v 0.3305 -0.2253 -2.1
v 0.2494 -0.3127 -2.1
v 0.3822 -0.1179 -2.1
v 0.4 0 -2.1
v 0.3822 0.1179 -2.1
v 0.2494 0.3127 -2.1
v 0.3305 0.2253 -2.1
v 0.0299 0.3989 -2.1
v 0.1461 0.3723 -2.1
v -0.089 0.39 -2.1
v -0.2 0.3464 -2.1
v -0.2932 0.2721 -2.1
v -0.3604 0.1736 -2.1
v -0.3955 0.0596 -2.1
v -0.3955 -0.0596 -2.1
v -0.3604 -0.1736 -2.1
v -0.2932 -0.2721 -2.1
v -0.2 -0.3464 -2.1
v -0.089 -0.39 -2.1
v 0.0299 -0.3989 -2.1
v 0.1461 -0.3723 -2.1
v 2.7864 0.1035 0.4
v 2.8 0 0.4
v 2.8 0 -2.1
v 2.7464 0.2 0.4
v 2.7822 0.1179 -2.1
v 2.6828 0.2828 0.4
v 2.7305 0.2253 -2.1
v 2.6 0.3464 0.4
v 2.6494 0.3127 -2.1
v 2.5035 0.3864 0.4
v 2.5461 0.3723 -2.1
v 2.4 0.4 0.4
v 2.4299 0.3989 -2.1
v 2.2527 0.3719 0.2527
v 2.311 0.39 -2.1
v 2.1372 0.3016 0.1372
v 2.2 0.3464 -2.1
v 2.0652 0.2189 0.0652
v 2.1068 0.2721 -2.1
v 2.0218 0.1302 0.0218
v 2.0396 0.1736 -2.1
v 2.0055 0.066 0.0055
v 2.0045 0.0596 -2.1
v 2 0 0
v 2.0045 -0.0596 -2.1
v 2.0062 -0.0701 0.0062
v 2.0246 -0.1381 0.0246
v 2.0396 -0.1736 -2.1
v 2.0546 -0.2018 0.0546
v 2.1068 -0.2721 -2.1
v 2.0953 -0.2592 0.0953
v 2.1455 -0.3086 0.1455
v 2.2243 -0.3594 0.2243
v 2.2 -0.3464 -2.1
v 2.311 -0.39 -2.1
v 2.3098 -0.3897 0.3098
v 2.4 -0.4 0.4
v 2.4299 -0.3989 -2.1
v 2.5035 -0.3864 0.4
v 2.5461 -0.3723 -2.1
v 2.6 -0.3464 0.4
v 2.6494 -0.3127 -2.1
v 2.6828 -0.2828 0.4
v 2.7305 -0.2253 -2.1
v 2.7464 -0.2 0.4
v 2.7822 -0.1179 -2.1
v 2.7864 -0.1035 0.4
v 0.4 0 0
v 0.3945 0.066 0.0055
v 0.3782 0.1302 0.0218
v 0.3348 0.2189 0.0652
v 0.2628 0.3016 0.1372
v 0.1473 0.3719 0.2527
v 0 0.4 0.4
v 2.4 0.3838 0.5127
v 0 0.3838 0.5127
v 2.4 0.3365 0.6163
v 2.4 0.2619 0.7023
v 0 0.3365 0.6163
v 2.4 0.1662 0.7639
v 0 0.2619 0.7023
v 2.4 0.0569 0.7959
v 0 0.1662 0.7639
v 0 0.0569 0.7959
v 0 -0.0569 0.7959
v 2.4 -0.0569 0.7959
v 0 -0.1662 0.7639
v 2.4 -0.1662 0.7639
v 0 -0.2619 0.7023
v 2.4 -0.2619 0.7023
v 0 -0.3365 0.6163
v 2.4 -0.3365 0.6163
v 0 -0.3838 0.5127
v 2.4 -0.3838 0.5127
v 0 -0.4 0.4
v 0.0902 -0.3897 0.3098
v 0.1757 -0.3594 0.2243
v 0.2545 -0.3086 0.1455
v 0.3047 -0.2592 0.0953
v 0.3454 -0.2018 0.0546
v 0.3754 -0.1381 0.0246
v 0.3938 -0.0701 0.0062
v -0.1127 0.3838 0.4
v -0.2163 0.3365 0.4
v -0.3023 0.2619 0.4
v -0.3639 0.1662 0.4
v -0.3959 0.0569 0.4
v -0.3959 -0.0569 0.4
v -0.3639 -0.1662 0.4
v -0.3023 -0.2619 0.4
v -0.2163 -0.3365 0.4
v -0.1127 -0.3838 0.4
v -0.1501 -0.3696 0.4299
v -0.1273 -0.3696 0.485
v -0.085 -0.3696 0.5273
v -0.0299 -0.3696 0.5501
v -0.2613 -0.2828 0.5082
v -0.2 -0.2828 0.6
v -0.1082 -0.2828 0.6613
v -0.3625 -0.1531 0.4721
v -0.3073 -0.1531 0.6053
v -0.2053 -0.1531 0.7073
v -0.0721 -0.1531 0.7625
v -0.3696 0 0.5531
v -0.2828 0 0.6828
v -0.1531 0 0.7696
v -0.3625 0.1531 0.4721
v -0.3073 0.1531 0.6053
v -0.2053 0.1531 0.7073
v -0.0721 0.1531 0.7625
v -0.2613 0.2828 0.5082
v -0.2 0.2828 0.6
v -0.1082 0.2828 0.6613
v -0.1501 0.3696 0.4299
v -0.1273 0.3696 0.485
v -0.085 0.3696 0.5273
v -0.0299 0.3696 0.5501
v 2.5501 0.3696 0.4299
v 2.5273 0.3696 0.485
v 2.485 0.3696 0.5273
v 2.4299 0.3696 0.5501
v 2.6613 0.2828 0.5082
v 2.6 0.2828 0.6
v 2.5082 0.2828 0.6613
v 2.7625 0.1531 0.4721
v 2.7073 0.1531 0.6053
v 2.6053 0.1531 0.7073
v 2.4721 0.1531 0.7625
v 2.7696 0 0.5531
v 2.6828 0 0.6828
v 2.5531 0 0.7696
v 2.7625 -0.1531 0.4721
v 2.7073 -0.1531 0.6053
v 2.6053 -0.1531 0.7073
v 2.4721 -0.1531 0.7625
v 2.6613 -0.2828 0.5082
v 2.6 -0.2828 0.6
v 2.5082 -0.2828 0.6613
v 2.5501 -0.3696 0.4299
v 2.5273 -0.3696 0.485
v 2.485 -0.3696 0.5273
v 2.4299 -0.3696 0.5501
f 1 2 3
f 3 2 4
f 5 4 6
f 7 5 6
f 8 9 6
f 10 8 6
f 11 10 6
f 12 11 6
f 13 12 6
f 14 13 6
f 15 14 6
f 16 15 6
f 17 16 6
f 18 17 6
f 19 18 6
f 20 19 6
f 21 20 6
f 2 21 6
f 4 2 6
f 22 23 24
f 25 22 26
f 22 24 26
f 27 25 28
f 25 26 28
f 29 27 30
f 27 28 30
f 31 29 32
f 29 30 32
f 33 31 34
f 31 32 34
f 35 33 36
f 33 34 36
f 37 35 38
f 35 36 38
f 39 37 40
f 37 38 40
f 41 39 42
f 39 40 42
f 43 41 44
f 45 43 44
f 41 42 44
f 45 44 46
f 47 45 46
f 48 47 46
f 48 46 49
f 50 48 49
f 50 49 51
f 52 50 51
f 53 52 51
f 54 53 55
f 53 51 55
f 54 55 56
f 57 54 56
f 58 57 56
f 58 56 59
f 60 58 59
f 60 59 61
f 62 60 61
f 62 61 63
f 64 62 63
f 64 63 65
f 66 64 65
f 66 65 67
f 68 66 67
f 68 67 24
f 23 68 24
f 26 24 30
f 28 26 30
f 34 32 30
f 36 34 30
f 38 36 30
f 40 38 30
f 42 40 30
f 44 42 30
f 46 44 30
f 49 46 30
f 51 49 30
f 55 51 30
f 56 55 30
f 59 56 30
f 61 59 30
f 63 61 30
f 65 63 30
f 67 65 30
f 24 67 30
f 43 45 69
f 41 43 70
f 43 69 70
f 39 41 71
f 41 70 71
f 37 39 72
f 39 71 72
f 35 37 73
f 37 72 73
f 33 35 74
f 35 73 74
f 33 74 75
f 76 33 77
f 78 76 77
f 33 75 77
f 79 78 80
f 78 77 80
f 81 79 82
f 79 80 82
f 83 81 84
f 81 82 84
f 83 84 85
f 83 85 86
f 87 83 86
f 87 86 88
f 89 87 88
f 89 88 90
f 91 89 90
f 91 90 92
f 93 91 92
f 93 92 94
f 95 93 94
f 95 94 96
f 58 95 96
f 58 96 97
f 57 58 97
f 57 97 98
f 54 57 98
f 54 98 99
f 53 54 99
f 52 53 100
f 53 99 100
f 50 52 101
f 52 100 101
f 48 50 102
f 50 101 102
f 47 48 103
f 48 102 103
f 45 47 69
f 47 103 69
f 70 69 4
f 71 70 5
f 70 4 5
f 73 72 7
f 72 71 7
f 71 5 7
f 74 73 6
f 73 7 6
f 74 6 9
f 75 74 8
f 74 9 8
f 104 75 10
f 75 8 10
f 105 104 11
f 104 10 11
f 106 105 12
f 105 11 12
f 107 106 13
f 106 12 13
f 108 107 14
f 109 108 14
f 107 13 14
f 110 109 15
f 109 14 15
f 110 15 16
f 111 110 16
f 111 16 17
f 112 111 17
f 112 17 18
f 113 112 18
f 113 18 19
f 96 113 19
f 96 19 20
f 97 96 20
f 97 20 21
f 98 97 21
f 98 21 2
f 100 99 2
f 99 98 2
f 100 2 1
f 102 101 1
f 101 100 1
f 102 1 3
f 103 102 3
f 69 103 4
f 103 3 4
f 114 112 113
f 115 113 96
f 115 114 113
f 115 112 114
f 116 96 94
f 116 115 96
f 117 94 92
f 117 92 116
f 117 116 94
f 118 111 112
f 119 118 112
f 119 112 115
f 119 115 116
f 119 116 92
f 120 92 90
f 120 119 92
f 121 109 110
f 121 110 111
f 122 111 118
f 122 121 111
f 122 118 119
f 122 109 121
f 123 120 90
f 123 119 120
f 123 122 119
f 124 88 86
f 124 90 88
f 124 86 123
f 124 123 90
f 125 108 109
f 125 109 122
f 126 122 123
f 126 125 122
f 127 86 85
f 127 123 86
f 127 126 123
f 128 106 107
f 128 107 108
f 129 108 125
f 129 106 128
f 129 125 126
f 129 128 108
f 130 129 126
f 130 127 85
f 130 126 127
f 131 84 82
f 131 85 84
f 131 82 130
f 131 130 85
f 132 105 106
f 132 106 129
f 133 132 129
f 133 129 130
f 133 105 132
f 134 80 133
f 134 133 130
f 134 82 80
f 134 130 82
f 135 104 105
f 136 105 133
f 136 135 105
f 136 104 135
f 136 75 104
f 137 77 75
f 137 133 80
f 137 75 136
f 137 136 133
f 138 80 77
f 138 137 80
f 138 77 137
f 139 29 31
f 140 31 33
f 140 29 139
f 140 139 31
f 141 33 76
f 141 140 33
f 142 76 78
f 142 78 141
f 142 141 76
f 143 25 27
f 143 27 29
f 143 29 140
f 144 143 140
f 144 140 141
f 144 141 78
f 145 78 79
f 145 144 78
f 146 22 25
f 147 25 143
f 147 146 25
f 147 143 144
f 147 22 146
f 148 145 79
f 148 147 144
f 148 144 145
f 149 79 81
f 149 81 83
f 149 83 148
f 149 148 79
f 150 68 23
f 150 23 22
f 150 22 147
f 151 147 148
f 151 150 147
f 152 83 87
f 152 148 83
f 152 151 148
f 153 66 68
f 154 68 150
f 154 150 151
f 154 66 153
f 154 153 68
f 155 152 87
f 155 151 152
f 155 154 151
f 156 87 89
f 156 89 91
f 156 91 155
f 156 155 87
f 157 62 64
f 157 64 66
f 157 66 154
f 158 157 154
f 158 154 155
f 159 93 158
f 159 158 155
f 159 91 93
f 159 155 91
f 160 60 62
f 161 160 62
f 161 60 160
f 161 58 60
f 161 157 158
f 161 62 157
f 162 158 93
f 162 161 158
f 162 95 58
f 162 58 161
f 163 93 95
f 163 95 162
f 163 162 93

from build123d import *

# Parameters (mm, degrees)
CYLINDER003_R     = 0.4
CYLINDER003_DEPTH = 2.4
CYLINDER004_R     = 0.4
CYLINDER004_DEPTH = 2.5
SPHERE_ANGLE      = 90
SPHERE001_ANGLE   = 90
CYLINDER002_R     = 0.4
CYLINDER002_DEPTH = 2.5


with BuildPart() as cylinder003:
    # Cylinder003 → Cylinder003 (new body)
    with BuildSketch(Plane(origin=(0, 0, 0.4), x_dir=(0, 0, -1), z_dir=(1, 0, 0))):
        Circle(CYLINDER003_R)
    extrude(amount=CYLINDER003_DEPTH)


with BuildPart() as cylinder004:
    # Cylinder004 → Cylinder004 (new body)
    with BuildSketch(Plane(origin=(2.4, 0, -2.1), x_dir=(1, 0, 0), z_dir=(0, 0, 1))):
        Circle(CYLINDER004_R)
    extrude(amount=CYLINDER004_DEPTH)


with BuildPart() as sphere:
    # Sphere → Sphere (revolve)
    with BuildSketch(Plane(origin=(0, 0, 0.4), x_dir=(-1, 0, 0), z_dir=(0, 0, -1))):
        with BuildLine():
            ThreePointArc((0, -0.4), (0.4, 0), (0, 0.4))
            Line((0, 0.4), (0, -0.4))
        make_face()
    revolve(axis=Axis((0, 0, 0.4), (0, 1, 0)), revolution_arc=SPHERE_ANGLE)


with BuildPart() as sphere001:
    # Sphere001 → Sphere001 (revolve)
    with BuildSketch(Plane(origin=(2.4, 0, 0.4), x_dir=(1, 0, 0), z_dir=(0, 0, -1))):
        with BuildLine():
            ThreePointArc((0, -0.4), (0.4, 0), (0, 0.4))
            Line((0, 0.4), (0, -0.4))
        make_face()
    revolve(axis=Axis((2.4, 0, 0.4), (0, -1, 0)), revolution_arc=SPHERE001_ANGLE)


with BuildPart() as jumper_2_40mm:
    # Cylinder002 → Cylinder002 (new body)
    with BuildSketch(Plane.XY.offset(-2.1)):
        Circle(CYLINDER002_R)
    extrude(amount=CYLINDER002_DEPTH)

    # Fusion001: union Cylinder003, Cylinder004, Sphere, Sphere001
    add(cylinder003.part)
    add(cylinder004.part)
    add(sphere.part)
    add(sphere001.part)


solid = jumper_2_40mm.part
